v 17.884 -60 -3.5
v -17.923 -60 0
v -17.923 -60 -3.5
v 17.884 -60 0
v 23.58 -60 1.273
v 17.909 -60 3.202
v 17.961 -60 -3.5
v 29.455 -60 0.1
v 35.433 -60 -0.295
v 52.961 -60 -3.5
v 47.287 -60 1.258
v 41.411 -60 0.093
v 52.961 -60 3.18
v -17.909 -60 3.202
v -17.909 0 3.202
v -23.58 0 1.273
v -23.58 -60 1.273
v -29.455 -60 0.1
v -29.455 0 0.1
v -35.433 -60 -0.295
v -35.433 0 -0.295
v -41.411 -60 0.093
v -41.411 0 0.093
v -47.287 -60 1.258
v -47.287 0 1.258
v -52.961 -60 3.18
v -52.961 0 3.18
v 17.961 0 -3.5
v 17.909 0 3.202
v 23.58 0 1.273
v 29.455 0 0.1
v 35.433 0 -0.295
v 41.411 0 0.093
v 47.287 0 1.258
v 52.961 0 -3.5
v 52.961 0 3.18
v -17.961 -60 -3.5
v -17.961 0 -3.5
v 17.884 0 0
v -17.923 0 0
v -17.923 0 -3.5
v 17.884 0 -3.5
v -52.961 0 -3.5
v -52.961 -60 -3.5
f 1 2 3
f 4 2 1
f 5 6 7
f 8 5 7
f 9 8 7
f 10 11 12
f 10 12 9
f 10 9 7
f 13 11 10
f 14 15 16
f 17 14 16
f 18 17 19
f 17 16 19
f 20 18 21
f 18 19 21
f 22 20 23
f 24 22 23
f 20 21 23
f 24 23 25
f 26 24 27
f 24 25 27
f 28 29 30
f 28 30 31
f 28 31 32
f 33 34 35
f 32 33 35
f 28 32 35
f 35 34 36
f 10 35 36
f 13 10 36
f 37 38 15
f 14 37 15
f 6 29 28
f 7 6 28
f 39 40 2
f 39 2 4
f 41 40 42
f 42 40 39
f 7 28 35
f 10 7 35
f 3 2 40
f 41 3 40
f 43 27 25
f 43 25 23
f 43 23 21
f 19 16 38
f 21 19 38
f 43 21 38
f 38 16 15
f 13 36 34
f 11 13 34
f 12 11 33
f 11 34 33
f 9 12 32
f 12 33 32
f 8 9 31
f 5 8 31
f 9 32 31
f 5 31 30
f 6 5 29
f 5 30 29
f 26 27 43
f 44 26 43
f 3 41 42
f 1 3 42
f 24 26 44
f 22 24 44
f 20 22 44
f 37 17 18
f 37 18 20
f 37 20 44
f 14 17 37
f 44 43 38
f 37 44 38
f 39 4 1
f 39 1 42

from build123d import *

# Parameters (mm, degrees)
F1_DEPTH = 60
F2_W     = 35.80684
F2_H     = 60
F3_DEPTH = 3.5


with BuildPart() as f1:
    # F0 (on Front) → F1 (new body)
    with BuildSketch(Plane.XZ):
        with BuildLine():
            Line((-17.961221, -3.5), (-17.90851, 3.202184))
            ThreePointArc((-17.90851, 3.202184), (-35.432694, -0.295219), (-52.961221, 3.180348))
            Line((-52.961221, 3.180348), (-52.961221, -3.5))
            Line((-52.961221, -3.5), (-17.961221, -3.5))
        make_face()
        with BuildLine():
            ThreePointArc((52.961221, 3.180348), (35.432694, -0.295219), (17.90851, 3.202184))
            Line((17.90851, 3.202184), (17.961221, -3.5))
            Line((17.961221, -3.5), (52.961221, -3.5))
            Line((52.961221, -3.5), (52.961221, 3.180348))
        make_face()
    extrude(amount=F1_DEPTH)


with BuildPart() as f3:
    # F2 (on Top) → F3 (new body)
    with BuildSketch(Plane.XY):
        with Locations((-0.019479, -30)):
            Rectangle(F2_W, F2_H)
    extrude(amount=-F3_DEPTH)


solid = Compound([f1.part, f3.part])
